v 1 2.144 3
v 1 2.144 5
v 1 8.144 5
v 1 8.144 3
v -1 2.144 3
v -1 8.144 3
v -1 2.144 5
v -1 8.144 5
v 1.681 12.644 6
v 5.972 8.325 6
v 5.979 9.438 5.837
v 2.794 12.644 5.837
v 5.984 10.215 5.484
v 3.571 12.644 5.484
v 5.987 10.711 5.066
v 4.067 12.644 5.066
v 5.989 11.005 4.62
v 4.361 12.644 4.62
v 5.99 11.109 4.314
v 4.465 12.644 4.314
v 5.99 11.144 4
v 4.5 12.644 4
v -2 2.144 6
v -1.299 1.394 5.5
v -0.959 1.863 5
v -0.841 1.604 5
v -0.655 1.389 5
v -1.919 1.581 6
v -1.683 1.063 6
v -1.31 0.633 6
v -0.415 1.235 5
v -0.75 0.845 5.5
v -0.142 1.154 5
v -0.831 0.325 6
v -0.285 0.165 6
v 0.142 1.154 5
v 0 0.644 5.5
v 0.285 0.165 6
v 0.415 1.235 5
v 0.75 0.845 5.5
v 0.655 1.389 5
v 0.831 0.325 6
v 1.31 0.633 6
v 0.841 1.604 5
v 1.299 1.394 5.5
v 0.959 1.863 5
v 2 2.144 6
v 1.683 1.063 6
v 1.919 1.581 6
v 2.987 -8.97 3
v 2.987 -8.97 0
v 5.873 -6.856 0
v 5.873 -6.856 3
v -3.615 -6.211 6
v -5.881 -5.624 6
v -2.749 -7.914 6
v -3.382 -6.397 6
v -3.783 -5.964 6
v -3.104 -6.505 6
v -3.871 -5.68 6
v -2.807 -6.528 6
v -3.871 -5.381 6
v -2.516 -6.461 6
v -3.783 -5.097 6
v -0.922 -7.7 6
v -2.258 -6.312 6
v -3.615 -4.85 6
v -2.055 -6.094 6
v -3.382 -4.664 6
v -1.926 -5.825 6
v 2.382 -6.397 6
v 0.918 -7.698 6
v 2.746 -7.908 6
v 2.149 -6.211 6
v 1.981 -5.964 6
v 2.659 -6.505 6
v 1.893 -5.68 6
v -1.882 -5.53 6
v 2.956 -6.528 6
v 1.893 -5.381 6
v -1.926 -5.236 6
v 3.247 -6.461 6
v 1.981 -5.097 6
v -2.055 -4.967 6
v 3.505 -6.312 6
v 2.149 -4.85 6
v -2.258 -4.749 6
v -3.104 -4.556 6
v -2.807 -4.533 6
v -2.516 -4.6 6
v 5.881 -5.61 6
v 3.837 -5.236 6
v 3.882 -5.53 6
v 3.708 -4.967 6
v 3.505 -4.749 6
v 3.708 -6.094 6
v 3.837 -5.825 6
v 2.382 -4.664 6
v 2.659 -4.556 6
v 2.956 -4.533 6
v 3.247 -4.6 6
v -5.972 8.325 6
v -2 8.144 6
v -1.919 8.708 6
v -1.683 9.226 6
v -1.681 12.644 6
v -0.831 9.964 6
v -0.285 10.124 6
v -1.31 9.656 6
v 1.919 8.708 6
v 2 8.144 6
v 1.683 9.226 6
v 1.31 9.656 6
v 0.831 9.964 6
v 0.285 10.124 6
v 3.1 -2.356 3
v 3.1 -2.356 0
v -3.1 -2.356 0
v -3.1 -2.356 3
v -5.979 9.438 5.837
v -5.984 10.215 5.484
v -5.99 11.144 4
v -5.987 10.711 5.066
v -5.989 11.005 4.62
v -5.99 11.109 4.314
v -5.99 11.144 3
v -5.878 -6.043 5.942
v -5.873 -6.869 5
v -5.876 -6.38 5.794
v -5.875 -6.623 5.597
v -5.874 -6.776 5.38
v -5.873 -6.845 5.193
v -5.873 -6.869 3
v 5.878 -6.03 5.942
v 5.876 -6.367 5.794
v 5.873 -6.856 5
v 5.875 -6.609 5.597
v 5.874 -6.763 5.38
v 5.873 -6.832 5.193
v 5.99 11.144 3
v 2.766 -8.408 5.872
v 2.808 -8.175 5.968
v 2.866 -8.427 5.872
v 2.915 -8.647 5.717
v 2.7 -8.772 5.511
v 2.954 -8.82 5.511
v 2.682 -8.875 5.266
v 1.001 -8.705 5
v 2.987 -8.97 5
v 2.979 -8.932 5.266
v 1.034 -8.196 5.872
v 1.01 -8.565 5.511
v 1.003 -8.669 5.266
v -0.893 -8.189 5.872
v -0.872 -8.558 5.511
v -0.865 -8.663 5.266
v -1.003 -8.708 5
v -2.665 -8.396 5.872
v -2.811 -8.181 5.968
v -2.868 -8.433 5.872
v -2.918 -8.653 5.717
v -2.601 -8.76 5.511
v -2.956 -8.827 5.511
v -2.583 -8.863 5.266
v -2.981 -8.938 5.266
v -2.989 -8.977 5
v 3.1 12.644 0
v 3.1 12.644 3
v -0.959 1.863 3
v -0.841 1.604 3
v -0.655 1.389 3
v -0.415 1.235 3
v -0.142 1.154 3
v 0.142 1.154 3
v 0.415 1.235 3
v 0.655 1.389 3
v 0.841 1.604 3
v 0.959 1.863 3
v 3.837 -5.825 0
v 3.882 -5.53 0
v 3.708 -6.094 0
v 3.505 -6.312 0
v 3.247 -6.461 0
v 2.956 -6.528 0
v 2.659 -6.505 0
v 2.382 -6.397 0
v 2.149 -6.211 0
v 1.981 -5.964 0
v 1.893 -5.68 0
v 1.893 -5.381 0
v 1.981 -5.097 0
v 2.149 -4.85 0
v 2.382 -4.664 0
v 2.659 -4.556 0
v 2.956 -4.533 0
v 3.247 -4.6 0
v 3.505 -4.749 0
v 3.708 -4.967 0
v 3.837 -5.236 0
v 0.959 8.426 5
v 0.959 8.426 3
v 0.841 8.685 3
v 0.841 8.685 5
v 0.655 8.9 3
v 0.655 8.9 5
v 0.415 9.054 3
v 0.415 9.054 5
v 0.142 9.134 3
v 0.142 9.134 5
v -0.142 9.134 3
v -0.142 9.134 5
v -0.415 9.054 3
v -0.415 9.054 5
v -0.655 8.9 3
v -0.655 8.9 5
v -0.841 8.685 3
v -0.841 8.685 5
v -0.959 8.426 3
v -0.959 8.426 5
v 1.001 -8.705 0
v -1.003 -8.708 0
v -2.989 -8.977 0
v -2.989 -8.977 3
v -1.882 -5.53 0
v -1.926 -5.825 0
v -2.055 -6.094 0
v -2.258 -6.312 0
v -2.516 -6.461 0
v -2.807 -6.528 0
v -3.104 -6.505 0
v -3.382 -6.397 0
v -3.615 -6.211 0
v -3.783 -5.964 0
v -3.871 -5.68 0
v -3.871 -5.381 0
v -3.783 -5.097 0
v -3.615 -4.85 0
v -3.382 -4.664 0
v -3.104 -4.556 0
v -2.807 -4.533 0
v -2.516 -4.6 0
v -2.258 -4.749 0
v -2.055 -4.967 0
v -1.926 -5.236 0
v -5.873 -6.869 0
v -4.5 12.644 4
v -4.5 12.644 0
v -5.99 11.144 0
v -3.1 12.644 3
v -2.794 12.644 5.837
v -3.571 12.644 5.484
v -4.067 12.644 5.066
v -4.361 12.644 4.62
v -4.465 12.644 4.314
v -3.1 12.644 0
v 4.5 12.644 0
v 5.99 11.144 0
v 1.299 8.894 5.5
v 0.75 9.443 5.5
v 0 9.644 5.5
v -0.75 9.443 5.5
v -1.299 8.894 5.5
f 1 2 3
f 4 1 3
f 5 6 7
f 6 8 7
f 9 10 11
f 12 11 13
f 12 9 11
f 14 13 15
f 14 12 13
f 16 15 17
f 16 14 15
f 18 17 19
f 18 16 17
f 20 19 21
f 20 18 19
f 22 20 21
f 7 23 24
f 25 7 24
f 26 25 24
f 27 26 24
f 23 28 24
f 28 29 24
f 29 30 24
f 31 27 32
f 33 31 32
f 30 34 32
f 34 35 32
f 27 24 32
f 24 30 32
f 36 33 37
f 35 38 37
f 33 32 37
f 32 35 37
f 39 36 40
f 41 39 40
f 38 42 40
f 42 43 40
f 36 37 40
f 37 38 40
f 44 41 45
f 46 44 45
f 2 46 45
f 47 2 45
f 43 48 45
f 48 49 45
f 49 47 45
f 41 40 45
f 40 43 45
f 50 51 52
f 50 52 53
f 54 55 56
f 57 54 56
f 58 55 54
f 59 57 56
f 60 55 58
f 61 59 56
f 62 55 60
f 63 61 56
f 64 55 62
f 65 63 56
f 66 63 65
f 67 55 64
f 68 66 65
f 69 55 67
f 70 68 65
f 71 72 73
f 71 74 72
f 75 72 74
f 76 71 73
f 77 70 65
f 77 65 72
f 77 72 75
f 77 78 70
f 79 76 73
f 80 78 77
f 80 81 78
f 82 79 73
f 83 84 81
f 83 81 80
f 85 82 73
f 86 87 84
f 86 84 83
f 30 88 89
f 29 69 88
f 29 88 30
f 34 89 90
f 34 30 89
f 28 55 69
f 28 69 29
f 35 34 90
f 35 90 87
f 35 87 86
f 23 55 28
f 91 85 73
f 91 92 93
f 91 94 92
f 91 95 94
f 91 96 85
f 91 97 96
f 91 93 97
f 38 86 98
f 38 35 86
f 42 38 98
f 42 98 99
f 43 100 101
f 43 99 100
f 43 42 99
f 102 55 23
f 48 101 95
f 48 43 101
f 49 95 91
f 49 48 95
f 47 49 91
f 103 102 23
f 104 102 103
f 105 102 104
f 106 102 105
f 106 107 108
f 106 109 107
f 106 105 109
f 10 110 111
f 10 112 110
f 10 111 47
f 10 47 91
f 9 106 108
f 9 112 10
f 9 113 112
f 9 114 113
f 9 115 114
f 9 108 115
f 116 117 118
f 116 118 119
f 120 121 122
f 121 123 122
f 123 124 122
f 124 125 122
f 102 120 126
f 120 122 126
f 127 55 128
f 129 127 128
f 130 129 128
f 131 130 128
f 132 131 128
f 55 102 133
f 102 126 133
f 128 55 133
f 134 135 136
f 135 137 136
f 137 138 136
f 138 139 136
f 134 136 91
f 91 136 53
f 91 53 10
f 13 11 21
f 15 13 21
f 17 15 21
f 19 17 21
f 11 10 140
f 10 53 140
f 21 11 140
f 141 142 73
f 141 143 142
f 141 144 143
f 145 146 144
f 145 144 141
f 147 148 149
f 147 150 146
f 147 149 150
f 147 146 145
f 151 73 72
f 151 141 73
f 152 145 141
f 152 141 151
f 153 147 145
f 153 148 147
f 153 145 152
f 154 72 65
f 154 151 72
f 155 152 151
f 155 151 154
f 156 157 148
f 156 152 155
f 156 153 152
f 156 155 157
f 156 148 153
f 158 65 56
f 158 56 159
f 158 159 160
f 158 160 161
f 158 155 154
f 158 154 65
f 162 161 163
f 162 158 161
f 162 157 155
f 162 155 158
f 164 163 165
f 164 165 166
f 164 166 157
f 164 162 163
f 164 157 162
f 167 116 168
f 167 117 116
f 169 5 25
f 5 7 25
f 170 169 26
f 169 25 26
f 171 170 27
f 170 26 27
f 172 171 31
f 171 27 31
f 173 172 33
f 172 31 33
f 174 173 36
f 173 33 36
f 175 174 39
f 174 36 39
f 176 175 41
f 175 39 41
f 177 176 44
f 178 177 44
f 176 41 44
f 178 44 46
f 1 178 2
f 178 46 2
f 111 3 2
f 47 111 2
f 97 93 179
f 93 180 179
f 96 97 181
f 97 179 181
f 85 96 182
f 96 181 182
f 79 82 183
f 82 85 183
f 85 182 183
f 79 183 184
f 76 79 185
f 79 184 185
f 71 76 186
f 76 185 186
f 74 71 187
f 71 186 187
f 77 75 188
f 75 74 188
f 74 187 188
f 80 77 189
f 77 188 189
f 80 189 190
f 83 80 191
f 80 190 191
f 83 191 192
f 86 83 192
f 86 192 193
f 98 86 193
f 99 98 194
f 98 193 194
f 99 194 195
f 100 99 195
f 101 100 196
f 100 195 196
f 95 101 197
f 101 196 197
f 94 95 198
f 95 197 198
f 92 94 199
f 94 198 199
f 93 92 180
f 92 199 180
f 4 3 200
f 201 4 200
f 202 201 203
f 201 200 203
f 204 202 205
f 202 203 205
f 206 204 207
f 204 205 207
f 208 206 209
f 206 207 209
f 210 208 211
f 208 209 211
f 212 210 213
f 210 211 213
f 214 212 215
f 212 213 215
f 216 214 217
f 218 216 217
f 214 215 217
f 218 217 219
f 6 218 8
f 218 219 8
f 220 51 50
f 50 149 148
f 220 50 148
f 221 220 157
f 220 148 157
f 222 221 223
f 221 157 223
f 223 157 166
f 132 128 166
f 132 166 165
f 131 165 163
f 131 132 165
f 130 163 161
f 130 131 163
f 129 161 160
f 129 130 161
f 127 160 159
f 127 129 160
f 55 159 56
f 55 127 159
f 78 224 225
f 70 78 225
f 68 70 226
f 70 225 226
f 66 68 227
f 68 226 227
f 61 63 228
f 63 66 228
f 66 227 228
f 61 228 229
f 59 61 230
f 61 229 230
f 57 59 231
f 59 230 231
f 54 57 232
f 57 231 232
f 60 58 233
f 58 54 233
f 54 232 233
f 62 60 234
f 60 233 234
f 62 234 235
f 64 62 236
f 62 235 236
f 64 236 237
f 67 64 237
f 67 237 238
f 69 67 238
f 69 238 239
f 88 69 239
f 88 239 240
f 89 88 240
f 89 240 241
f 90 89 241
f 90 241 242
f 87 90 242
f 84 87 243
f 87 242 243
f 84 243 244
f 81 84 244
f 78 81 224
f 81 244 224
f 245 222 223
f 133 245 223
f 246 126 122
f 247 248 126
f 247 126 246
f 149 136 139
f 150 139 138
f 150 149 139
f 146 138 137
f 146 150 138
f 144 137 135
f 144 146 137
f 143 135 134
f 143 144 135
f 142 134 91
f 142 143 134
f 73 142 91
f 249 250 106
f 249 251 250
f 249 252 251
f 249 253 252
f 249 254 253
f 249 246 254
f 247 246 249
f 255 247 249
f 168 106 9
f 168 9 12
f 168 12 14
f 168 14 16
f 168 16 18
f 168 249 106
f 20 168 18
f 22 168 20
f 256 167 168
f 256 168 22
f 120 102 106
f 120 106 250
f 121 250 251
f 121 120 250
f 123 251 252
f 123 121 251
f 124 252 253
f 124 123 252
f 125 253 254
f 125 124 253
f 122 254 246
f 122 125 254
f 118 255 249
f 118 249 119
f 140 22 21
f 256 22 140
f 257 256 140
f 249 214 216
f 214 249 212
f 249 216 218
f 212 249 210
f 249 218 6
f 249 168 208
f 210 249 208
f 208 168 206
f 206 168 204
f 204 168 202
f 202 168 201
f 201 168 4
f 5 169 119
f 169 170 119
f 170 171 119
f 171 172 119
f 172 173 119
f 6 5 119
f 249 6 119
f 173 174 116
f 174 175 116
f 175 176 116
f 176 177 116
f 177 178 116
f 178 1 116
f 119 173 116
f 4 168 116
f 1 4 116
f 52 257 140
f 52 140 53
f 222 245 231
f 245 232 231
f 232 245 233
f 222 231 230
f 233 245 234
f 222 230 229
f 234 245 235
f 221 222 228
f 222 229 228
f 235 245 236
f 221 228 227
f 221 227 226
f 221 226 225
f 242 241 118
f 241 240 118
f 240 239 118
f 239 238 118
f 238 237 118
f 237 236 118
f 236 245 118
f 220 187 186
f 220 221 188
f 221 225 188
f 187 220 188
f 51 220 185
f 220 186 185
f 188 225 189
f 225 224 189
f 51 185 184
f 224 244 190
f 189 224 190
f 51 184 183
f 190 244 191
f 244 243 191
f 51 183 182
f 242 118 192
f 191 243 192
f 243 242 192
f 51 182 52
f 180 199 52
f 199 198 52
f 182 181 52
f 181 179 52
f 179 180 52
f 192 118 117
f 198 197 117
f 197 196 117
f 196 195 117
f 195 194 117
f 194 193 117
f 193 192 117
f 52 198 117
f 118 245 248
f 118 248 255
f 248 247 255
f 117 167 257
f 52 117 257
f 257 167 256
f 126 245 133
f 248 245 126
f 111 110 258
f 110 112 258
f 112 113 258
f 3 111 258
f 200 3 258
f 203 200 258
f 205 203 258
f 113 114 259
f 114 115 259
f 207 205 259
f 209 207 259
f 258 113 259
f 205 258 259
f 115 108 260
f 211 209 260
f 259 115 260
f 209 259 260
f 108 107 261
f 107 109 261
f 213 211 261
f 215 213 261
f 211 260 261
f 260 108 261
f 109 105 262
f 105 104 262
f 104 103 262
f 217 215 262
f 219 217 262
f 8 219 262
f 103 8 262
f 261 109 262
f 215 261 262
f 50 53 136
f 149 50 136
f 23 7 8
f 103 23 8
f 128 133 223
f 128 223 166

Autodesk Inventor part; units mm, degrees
ref_plane "YZ Plane" through (0, 0, 0) normal (1, 0, 0) x (0, 1, 0)
ref_plane "XZ Plane" through (0, 0, 0) normal (0, 1, 0) x (-1, 0, 0)
ref_plane "XY Plane" through (0, 0, 0) normal (0, 0, 1) x (1, 0, 0)
sketch "Sketch1" plane through (0, 0, 0) normal (0, 0, 1) x (1, 0, 0)
  circle A0 centre (2.8817, -5.5305) radius 1 projected
  circle A1 centre (-2.8817, -5.5305) radius 1 projected
  line L0 (4.5, 12.6443) -> (5.9902, 11.1443) projected
  line L1 (3, 12.6443) -> (4.5, 12.6443) projected
  line L2 (3, -2.3557) -> (3, 12.6443) projected
  line L3 (-3, -2.3557) -> (3, -2.3557) projected
  line L4 (-3, 12.6443) -> (-3, -2.3557) projected
  line L5 (-4.5, 12.6443) -> (-3, 12.6443) projected
  line L6 (-5.9902, 11.1443) -> (-4.5, 12.6443) projected
  line L7 (-5.8406, -11.8556) -> (-5.9902, 11.1443) projected
  line L8 (-3.8536, -9.8557) -> (-5.8406, -11.8556) projected
  line L9 (-3.8536, -9.8557) -> (3.8536, -9.8557) projected
  line L10 (5.8406, -11.8556) -> (3.8536, -9.8557) projected
  line L11 (5.9902, 11.1443) -> (5.8406, -11.8556) projected
  line L12 (3.8536, -9.8557) -> (5.8536, -9.8557)
  line L13 (-3.8536, -9.8557) -> (-5.8535, -9.8687)
  point P0 (0, 0)
extrude "Extrusion1" add sketch "Sketch1" along normal blind 3 contours L0 L11 L12 L9 L13 L7 L6 L5 L4 L3 L2 L1
sketch "Sketch2" plane through (0, 0, 3) normal (0, 0, 1) x (1, 0, 0)
  line L0 (-3, -2.3557) -> (-3, 12.6443) projected
  line L1 (-3, 12.6443) -> (-4.5, 12.6443) projected
  line L2 (-4.5, 12.6443) -> (-5.9902, 11.1443) projected
  line L3 (-5.9902, 11.1443) -> (-5.8535, -9.8687) projected
  line L4 (-5.8535, -9.8687) -> (-3.8536, -9.8557) projected
  line L5 (-3.8536, -9.8557) -> (5.8536, -9.8557) projected
  line L6 (5.8536, -9.8557) -> (5.9902, 11.1443) projected
  line L7 (5.9902, 11.1443) -> (4.5, 12.6443) projected
  line L8 (4.5, 12.6443) -> (3, 12.6443) projected
  line L9 (3, 12.6443) -> (3, -2.3557) projected
  line L10 (3, -2.3557) -> (-3, -2.3557) projected
  circle A0 centre (-2.8817, -5.5305) radius 1 projected
  circle A1 centre (2.8817, -5.5305) radius 1 projected
  line L11 (3, 12.6443) -> (3, -2.3557) projected
  line L12 (-3, 12.6443) -> (3, 12.6443)
  point P0 (0, 0)
extrude "Extrusion2" add sketch "Sketch2" along normal blind 3
sketch "Sketch3" plane through (0, 0, 6) normal (0, 0, 1) x (1, 0, 0)
  line L0 (-5.8535, -9.8687) -> (-3.8536, -9.8557) projected
  line L1 (-3.8536, -9.8557) -> (5.8536, -9.8557) projected
  line L2 (5.8536, -9.8557) -> (5.9902, 11.1443) projected
  line L3 (5.9902, 11.1443) -> (4.5, 12.6443) projected
  line L4 (4.5, 12.6443) -> (-4.5, 12.6443) projected
  line L5 (-4.5, 12.6443) -> (-5.9902, 11.1443) projected
  line L6 (-5.9902, 11.1443) -> (-5.8535, -9.8687) projected
  circle A0 centre (2.8817, -5.5305) radius 1 projected
  circle A1 centre (-2.8817, -5.5305) radius 1 projected
  line L7 (-5.8535, -9.8687) -> (-3.8536, -9.8557) projected
  arc A2 (5.8536, -9.8557) -> (-5.8535, -9.8687) centre (0.0154, -23.6729) ccw
  point P0 (0, 0)
  dimension "d4" = 15
extrude "Extrusion3" cut sketch "Sketch3" against normal blind 8 contours A2 L1 L0
chamfer "Chamfer1" distance 3 angle 45 2 edges at (5.8536, -9.8557, 3) (-5.8535, -9.8687, 3)
fillet "Fillet1" radius 2 2 edges at (5.2451, 11.8943, 6) (-5.2451, 11.8943, 6)
fillet "Fillet2" radius 1 3 edges at (-4.4311, -7.9228, 6) (-0.0013, -8.6729, 6) (4.4302, -7.913, 6)
sketch "Sketch4" plane through (0, 0, 6) normal (0, 0, 1) x (1, 0, 0)
  line L0 (-1, 8.1443) -> (-1, 2.1443)
  arc A0 (-1, 2.1443) -> (1, 2.1443) centre (0, 2.1443) ccw
  line L1 (1, 2.1443) -> (1, 8.1443)
  arc A1 (1, 8.1443) -> (-1, 8.1443) centre (0, 8.1443) ccw
  line L2 (5.9719, 8.3251) -> (1.6807, 12.6443)
  line L3 (5.9719, 8.3251) -> (5.8537, -9.8477)
  line L4 (3.4979, -11.4182) -> (5.8537, -9.8477)
  spline S0 degree 3 poles (3.7471, -14.0453) (3.5143, -13.7817) (3.313, -13.4738) (3.0785, -12.9028) (3.0205, -12.6553) (3.011, -12.2509) (3.0346, -12.0815) (3.1344, -11.8203) (3.188, -11.725) (3.325, -11.5531) (3.4063, -11.4793) (3.4979, -11.4182) knots 0 0 0 0 0.329568 0.329568 0.580897 0.580897 0.763488 0.763488 0.881593 0.881593 1 1 1 1
  arc A2 (-3.7471, -14.0453) -> (3.7471, -14.0453) centre (0, -17.3557) ccw
  spline S1 degree 3 poles (-3.4979, -11.4182) (-3.3811, -11.4961) (-3.2816, -11.5944) (-3.1273, -11.8263) (-3.0754, -11.9539) (-3.0096, -12.2519) (-3.0068, -12.4209) (-3.0565, -12.825) (-3.1338, -13.0604) (-3.3668, -13.5541) (-3.5446, -13.816) (-3.7471, -14.0453) knots 0 0 0 0 0.142201 0.142201 0.282073 0.282073 0.450832 0.450832 0.692964 0.692964 1 1 1 1
  line L5 (-5.8537, -9.8477) -> (-3.4979, -11.4182)
  line L6 (-5.8537, -9.8477) -> (-5.9719, 8.3251)
  line L7 (-1.6807, 12.6443) -> (-5.9719, 8.3251)
  line L8 (-1.6807, 12.6443) -> (1.6807, 12.6443)
  circle A3 centre (0, -17.3557) radius 1.5
  circle A4 centre (-2.8817, -5.5305) radius 1
  circle A5 centre (2.8817, -5.5305) radius 1
  point P0 (0, 0)
extrude "Extrusion4" cut sketch "Sketch4" against normal blind 8 contours A1 L1 A0 L0
chamfer "Chamfer2" distance 1 angle 45 4 edges at (-1, 5.1443, 6) (0, 9.1443, 6) (1, 5.1443, 6) (0, 1.1443, 6)
thicken "Thicken1" operation add thickness 0.1 both sides no extend neighbours yes toward (-1, 0, 0) faces at (-3, 2.6443, 1)
thicken "Thicken2" operation add thickness 0.1 both sides no extend neighbours yes toward (1, 0, 0) faces at (3, 7.6443, 1)
properties part number "arm_linkage_3"
